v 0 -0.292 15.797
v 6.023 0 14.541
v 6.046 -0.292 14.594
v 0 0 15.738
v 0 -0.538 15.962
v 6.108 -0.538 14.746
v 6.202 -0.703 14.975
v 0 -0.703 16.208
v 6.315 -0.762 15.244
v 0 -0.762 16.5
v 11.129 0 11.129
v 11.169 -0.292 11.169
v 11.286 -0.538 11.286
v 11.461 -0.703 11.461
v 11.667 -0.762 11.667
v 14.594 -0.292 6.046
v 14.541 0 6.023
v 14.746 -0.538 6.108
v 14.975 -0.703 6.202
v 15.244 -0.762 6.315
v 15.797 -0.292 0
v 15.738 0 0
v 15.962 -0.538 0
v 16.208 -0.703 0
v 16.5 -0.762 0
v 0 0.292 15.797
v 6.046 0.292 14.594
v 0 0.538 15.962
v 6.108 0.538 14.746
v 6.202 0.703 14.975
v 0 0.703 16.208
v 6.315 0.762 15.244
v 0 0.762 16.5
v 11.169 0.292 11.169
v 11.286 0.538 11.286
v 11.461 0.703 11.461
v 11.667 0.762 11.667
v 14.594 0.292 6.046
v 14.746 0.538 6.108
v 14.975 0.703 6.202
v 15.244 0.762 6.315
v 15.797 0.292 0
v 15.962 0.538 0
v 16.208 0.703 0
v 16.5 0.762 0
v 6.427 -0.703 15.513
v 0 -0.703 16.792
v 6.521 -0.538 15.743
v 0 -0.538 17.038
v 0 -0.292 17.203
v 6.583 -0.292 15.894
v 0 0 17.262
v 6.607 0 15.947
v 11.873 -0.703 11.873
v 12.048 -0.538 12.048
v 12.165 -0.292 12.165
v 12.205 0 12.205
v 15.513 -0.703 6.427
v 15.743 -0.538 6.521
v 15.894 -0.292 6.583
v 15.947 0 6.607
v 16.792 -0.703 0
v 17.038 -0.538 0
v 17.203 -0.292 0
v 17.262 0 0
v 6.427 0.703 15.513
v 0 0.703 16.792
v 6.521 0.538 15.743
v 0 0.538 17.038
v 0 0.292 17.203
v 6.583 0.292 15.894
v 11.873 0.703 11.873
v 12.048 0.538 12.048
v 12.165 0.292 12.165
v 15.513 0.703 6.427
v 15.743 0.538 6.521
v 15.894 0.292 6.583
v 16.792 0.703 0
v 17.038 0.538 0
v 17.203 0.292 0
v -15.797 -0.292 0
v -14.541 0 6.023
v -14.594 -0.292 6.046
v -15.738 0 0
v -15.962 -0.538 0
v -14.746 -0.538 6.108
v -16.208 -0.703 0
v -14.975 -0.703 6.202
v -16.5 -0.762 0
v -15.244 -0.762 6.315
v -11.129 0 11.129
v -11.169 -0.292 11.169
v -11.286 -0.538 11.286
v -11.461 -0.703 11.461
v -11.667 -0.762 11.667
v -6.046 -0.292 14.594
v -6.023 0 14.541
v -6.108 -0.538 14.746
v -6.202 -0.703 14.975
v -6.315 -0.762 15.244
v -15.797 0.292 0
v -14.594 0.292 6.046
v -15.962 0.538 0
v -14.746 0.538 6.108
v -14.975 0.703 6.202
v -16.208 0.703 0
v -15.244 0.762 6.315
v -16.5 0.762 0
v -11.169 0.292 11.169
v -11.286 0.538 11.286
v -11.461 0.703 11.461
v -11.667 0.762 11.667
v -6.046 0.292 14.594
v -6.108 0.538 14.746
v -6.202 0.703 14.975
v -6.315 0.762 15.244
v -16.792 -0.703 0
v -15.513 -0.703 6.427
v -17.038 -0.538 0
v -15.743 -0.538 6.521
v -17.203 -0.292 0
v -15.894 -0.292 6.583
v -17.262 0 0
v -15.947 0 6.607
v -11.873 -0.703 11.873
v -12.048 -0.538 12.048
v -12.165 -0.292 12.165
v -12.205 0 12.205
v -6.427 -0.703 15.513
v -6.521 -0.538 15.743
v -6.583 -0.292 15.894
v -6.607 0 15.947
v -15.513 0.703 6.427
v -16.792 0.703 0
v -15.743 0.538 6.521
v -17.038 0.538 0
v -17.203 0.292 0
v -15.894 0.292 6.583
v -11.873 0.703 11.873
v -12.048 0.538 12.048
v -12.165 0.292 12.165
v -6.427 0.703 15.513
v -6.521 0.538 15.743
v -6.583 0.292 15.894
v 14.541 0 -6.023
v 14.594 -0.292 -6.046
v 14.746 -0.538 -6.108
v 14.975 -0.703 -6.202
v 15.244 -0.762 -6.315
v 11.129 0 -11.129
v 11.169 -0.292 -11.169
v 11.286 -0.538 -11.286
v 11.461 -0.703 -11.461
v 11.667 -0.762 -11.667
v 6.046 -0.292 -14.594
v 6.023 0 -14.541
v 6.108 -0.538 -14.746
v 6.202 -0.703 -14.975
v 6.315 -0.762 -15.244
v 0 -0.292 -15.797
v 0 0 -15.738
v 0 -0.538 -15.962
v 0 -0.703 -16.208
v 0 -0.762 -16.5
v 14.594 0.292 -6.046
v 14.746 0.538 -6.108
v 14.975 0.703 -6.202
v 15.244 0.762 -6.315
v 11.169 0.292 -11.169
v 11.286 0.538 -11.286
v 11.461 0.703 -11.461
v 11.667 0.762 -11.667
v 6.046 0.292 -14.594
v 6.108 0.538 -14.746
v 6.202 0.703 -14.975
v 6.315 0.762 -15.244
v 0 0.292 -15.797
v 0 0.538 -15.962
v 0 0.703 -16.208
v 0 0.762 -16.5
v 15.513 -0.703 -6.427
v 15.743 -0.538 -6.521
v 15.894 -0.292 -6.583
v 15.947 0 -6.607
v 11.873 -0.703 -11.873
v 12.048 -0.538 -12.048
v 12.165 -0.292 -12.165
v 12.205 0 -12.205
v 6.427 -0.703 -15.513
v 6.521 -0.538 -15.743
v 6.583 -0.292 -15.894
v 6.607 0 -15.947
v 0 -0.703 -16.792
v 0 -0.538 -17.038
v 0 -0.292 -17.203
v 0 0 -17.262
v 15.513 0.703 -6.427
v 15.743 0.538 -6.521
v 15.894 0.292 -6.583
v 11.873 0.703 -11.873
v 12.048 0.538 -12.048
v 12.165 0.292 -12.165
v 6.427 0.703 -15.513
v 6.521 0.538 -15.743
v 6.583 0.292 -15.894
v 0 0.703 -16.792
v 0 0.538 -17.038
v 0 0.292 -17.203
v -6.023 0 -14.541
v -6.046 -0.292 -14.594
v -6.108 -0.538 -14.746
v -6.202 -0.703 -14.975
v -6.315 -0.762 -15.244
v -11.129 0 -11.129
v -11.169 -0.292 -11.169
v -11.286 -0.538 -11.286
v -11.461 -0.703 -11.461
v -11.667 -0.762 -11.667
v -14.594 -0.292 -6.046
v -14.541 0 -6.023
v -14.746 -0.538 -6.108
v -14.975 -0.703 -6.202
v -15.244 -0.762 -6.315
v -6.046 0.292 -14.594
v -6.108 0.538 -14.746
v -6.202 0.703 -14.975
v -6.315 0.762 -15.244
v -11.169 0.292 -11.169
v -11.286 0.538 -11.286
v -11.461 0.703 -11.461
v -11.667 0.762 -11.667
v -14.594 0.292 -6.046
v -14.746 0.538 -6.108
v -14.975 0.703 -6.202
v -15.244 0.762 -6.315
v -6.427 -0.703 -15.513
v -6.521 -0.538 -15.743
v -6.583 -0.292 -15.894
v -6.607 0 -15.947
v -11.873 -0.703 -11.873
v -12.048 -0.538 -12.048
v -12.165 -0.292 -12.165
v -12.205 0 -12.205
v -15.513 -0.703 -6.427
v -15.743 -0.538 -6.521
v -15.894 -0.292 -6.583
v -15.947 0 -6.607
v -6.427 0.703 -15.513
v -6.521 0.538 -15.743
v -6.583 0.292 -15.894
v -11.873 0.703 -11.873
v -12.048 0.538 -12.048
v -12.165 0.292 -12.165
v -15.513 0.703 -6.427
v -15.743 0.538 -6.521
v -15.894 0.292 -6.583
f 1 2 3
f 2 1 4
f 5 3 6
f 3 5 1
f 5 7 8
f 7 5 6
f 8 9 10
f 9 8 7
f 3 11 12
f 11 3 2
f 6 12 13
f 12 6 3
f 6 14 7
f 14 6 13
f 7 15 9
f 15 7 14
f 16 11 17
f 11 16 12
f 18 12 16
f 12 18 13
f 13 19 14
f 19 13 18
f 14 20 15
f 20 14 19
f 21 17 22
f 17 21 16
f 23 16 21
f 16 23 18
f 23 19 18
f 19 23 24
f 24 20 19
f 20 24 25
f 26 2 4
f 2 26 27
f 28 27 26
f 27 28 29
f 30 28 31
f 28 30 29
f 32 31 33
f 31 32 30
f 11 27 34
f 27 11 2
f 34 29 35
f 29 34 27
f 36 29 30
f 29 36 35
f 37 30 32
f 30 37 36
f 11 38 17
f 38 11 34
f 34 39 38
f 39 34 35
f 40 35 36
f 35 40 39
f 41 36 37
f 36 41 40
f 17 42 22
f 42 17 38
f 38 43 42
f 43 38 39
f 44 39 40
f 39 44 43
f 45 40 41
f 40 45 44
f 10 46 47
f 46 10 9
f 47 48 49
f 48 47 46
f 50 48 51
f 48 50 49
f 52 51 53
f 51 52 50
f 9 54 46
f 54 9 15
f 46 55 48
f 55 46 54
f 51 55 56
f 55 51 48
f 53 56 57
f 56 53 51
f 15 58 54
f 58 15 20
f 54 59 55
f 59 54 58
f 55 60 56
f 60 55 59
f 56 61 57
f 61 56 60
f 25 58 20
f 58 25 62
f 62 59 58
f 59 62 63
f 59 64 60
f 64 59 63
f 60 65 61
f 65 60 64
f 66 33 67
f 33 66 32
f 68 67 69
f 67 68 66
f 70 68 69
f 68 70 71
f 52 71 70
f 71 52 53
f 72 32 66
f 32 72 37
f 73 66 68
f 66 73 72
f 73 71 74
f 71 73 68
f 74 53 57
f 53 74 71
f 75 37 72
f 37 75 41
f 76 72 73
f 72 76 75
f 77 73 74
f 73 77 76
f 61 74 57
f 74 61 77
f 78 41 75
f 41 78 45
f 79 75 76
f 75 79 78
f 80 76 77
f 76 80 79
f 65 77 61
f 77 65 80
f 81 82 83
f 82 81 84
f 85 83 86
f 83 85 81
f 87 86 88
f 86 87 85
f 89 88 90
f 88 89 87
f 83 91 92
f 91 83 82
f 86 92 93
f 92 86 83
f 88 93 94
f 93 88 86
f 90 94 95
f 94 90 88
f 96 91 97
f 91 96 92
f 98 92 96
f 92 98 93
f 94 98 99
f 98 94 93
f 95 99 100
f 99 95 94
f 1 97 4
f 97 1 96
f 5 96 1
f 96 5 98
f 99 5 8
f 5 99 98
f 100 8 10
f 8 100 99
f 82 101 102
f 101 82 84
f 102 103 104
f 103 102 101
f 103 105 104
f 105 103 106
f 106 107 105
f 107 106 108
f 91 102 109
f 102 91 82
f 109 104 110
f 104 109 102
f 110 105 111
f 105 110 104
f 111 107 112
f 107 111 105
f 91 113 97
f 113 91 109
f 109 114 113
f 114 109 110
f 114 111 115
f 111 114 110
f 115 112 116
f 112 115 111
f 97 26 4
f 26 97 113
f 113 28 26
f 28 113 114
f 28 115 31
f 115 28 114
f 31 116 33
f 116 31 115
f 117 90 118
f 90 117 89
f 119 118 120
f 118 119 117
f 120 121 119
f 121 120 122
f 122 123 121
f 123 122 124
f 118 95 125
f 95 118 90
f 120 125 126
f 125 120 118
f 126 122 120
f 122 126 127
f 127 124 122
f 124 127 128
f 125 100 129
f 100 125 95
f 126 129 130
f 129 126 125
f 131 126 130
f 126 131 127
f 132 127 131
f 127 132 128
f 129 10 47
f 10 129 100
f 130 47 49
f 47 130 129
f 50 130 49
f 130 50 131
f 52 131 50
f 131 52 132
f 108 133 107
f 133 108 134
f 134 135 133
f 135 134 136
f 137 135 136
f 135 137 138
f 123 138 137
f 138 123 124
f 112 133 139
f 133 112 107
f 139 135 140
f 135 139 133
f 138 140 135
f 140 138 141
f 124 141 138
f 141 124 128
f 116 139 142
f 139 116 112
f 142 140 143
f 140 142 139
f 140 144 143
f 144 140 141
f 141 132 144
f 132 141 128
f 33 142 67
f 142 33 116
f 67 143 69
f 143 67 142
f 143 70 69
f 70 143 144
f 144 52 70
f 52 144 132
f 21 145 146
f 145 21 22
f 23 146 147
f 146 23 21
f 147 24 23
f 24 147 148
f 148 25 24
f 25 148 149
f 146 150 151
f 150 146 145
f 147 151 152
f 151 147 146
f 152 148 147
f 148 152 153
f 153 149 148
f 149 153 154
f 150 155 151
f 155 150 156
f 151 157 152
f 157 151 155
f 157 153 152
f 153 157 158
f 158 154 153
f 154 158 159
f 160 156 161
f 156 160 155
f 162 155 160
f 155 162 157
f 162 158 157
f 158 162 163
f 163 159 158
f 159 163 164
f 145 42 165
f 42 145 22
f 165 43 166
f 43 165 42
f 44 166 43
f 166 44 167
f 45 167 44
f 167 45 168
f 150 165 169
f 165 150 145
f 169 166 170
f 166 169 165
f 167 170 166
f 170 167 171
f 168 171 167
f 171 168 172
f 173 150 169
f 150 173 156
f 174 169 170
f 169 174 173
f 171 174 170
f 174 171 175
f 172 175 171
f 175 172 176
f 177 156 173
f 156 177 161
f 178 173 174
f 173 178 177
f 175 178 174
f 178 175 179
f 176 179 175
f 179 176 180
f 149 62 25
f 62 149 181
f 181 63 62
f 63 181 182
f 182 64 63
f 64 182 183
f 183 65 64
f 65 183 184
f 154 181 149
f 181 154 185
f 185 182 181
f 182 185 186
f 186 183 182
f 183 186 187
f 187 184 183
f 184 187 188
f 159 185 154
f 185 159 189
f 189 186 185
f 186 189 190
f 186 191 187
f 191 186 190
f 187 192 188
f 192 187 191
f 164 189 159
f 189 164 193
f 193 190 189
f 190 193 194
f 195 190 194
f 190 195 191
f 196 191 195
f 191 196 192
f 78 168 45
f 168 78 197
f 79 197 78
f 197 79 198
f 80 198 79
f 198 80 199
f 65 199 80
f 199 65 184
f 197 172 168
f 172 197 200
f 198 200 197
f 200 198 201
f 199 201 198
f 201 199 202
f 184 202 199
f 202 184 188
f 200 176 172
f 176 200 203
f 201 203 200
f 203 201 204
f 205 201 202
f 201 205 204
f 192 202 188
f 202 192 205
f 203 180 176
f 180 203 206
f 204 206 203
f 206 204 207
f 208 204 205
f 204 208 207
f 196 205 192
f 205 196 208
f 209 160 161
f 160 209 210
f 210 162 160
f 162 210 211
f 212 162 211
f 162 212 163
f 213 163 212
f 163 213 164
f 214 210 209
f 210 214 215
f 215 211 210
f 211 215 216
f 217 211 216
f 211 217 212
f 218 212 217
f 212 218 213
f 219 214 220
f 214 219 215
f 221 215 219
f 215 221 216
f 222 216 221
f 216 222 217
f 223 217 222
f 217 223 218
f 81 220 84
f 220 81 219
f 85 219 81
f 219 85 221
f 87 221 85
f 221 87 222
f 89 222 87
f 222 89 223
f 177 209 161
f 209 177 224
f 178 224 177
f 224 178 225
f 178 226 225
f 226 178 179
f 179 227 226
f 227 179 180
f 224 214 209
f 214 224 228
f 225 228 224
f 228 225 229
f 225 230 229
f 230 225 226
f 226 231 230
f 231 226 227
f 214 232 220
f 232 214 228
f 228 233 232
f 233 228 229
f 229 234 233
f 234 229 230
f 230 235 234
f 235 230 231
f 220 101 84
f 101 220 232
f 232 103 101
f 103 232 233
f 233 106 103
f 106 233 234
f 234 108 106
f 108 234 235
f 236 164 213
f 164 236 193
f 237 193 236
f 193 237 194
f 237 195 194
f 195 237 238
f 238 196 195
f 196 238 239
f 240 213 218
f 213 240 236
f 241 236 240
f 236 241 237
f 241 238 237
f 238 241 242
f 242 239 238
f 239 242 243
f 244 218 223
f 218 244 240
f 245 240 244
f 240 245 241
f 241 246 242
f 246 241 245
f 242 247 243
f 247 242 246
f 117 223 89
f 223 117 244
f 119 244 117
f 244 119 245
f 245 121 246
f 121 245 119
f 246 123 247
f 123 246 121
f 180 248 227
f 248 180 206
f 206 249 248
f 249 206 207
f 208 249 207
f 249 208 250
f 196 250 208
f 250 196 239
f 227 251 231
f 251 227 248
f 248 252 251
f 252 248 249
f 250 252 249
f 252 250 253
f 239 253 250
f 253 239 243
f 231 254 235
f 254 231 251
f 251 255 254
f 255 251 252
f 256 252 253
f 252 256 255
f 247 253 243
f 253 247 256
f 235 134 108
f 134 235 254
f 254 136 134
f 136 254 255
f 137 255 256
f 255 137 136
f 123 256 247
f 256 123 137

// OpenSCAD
use <../lib.scad>
use <../p/t04i0462.scad>
use <../p/t04o0462.scad>
function ldraw_lib__85546() = [
// 0 Rubber Belt Round 33 /  1.6
// 0 Name: 85546.dat
// 0 Author: Philippe Hurbain [Philo]
// 0 !LDRAW_ORG Part UPDATE 2014-02
// 0 !LICENSE Licensed under CC BY 4.0 : see CAreadme.txt
// 
// 0 BFC CERTIFY CCW
  [0,"BFC","CERTIFY"],
  [0,"BFC","CCW"],
// 
// 0 !CATEGORY Technic
// 0 !KEYWORDS BrickLink x90
// 
// 0 !HISTORY 2014-12-23 [PTadmin] Official Update 2014-02
// 
// 
// 0 // Nomenclature: Rubber Belt [Round|Square] belt_diameter_(mm) / belt_thickness_(mm)
// 
// 1 16 0 0 0 0 0 41.25 -41.25 0 0 0 -41.25 0 t04i0462.dat
  [1,16,0,0,0,0,0,41.25,-41.25,0,0,0,-41.25,0, ldraw_lib__t04i0462()],
// 1 16 0 0 0 0 0 41.25 -41.25 0 0 0 41.25 0 t04i0462.dat
  [1,16,0,0,0,0,0,41.25,-41.25,0,0,0,41.25,0, ldraw_lib__t04i0462()],
// 1 16 0 0 0 0 0 41.25 -41.25 0 0 0 -41.25 0 t04o0462.dat
  [1,16,0,0,0,0,0,41.25,-41.25,0,0,0,-41.25,0, ldraw_lib__t04o0462()],
// 1 16 0 0 0 0 0 41.25 -41.25 0 0 0 41.25 0 t04o0462.dat
  [1,16,0,0,0,0,0,41.25,-41.25,0,0,0,41.25,0, ldraw_lib__t04o0462()],
// 1 16 0 0 0 -41.25 0 0 0 0 -41.25 0 -41.25 0 t04i0462.dat
  [1,16,0,0,0,-41.25,0,0,0,0,-41.25,0,-41.25,0, ldraw_lib__t04i0462()],
// 1 16 0 0 0 -41.25 0 0 0 0 -41.25 0 41.25 0 t04i0462.dat
  [1,16,0,0,0,-41.25,0,0,0,0,-41.25,0,41.25,0, ldraw_lib__t04i0462()],
// 1 16 0 0 0 -41.25 0 0 0 0 -41.25 0 -41.25 0 t04o0462.dat
  [1,16,0,0,0,-41.25,0,0,0,0,-41.25,0,-41.25,0, ldraw_lib__t04o0462()],
// 1 16 0 0 0 -41.25 0 0 0 0 -41.25 0 41.25 0 t04o0462.dat
  [1,16,0,0,0,-41.25,0,0,0,0,-41.25,0,41.25,0, ldraw_lib__t04o0462()],
// 1 16 0 0 0 41.25 0 0 0 0 41.25 0 -41.25 0 t04i0462.dat
  [1,16,0,0,0,41.25,0,0,0,0,41.25,0,-41.25,0, ldraw_lib__t04i0462()],
// 1 16 0 0 0 41.25 0 0 0 0 41.25 0 41.25 0 t04i0462.dat
  [1,16,0,0,0,41.25,0,0,0,0,41.25,0,41.25,0, ldraw_lib__t04i0462()],
// 1 16 0 0 0 41.25 0 0 0 0 41.25 0 -41.25 0 t04o0462.dat
  [1,16,0,0,0,41.25,0,0,0,0,41.25,0,-41.25,0, ldraw_lib__t04o0462()],
// 1 16 0 0 0 41.25 0 0 0 0 41.25 0 41.25 0 t04o0462.dat
  [1,16,0,0,0,41.25,0,0,0,0,41.25,0,41.25,0, ldraw_lib__t04o0462()],
// 1 16 0 0 0 0 0 -41.25 41.25 0 0 0 -41.25 0 t04i0462.dat
  [1,16,0,0,0,0,0,-41.25,41.25,0,0,0,-41.25,0, ldraw_lib__t04i0462()],
// 1 16 0 0 0 0 0 -41.25 41.25 0 0 0 41.25 0 t04i0462.dat
  [1,16,0,0,0,0,0,-41.25,41.25,0,0,0,41.25,0, ldraw_lib__t04i0462()],
// 1 16 0 0 0 0 0 -41.25 41.25 0 0 0 -41.25 0 t04o0462.dat
  [1,16,0,0,0,0,0,-41.25,41.25,0,0,0,-41.25,0, ldraw_lib__t04o0462()],
// 1 16 0 0 0 0 0 -41.25 41.25 0 0 0 41.25 0 t04o0462.dat
  [1,16,0,0,0,0,0,-41.25,41.25,0,0,0,41.25,0, ldraw_lib__t04o0462()],
];
module ldraw_lib__85546(step=0, col=false, unit=2/5, alt=false, line=0.2, solid=!$preview)
    makepoly(ldraw_lib__85546(), step=step, col=col, unit=unit, alt=alt, line=line, solid=solid);
ldraw_lib__85546(line=0.2);
